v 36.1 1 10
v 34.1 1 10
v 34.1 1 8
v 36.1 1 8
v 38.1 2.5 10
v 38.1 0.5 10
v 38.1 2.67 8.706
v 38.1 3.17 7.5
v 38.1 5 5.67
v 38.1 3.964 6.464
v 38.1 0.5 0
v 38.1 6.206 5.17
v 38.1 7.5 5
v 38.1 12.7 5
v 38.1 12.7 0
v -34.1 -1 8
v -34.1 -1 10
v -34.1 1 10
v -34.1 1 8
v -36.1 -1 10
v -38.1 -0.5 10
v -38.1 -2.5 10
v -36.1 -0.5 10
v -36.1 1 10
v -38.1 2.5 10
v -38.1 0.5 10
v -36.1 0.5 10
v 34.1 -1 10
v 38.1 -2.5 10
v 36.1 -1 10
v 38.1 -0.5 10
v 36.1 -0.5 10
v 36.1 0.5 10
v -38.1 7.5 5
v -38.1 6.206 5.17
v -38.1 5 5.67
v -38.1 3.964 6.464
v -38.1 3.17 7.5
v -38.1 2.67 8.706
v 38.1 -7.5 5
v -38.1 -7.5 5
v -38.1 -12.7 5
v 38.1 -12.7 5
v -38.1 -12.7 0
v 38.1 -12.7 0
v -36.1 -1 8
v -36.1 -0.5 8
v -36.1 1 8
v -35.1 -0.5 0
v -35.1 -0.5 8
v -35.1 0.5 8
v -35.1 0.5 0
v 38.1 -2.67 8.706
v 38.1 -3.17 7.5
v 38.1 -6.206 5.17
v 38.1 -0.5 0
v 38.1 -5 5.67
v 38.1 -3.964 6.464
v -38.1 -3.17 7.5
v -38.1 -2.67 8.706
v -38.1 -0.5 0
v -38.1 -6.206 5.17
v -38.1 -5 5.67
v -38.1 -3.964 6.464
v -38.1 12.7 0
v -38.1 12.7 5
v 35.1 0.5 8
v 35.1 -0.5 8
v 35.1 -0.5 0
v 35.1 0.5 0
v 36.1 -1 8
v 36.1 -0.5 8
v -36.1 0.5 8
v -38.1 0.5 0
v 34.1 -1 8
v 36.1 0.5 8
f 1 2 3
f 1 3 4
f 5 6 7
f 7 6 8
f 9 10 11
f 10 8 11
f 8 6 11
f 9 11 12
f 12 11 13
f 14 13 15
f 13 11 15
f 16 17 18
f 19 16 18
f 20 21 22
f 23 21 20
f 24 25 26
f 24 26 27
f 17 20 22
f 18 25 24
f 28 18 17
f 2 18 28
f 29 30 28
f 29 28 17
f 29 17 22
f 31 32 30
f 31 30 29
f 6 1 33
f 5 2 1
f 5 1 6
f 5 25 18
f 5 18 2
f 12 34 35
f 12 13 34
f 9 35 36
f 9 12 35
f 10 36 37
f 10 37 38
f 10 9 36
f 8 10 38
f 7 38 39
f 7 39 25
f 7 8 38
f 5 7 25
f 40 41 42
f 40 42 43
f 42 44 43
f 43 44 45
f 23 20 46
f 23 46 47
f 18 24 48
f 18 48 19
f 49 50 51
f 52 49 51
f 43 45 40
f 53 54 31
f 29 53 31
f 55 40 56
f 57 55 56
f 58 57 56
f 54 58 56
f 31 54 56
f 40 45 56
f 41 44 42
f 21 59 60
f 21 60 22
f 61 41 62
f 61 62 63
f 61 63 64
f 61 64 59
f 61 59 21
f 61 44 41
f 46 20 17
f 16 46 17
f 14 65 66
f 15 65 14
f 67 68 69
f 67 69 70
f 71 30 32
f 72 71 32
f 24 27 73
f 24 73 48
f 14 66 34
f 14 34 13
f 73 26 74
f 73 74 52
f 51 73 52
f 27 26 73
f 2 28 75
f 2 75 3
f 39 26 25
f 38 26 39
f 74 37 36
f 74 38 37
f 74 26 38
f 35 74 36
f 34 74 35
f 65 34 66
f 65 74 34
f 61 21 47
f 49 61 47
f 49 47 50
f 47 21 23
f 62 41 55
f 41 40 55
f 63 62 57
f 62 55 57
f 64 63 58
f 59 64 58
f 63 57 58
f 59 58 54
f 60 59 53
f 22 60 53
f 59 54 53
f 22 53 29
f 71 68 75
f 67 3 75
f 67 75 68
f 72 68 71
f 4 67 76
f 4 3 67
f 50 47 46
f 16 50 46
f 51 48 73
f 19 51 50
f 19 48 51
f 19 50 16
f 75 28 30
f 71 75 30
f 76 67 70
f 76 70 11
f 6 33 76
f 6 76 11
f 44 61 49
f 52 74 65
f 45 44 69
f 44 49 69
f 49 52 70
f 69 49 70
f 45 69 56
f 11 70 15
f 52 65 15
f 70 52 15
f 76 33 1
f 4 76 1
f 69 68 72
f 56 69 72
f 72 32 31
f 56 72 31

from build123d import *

# Parameters (mm, degrees)
F0_W     = 76.2
F0_H     = 25.4
F1_DEPTH = 5
F2_W     = 76.2
F2_H     = 5
F3_DEPTH = 5
F4_R     = 4.99999
F5_W     = 2
F5_H     = 2
F7_DEPTH = 2
F6_W     = 3
F6_H     = 1
F8_DEPTH = 10.001


# Not quite as in the source:
# - a fillet or chamfer is up to 0.001 mm smaller than in the source, because OpenCascade refuses the exact size


with BuildPart() as f1:
    # F0 (on Top) → F1 (new body)
    with BuildSketch(Plane.XY):
        Rectangle(F0_W, F0_H)
    extrude(amount=F1_DEPTH)

    # F2 (on face) → F3 (join)
    with BuildSketch(Plane.XY.offset(5)):
        Rectangle(F2_W, F2_H)
    extrude(amount=F3_DEPTH)

    # F4 (radius 5 in the source; OpenCascade refuses exactly that, so slightly less here)
    f4_edges = [f1.edges().sort_by_distance(p)[0] for p in [
        (0, -2.5, 5),
        (0, 2.5, 5),
    ]]
    fillet(f4_edges, radius=F4_R)

    # F5 (on face) → F7 (cut)
    with BuildSketch(Plane.XY.offset(10)):
        with Locations((35.1, 0)):
            Rectangle(F5_W, F5_H)
        with Locations((-35.1, 0)):
            Rectangle(F5_W, F5_H)
    extrude(amount=-F7_DEPTH, mode=Mode.SUBTRACT)

    # F6 (on face) → F8 (cut, through all)
    with BuildSketch(Plane.XY.offset(10)):
        with Locations((36.6, 0)):
            Rectangle(F6_W, F6_H)
        with Locations((-36.6, 0)):
            Rectangle(F6_W, F6_H)
    extrude(amount=-F8_DEPTH, mode=Mode.SUBTRACT)


solid = f1.part
